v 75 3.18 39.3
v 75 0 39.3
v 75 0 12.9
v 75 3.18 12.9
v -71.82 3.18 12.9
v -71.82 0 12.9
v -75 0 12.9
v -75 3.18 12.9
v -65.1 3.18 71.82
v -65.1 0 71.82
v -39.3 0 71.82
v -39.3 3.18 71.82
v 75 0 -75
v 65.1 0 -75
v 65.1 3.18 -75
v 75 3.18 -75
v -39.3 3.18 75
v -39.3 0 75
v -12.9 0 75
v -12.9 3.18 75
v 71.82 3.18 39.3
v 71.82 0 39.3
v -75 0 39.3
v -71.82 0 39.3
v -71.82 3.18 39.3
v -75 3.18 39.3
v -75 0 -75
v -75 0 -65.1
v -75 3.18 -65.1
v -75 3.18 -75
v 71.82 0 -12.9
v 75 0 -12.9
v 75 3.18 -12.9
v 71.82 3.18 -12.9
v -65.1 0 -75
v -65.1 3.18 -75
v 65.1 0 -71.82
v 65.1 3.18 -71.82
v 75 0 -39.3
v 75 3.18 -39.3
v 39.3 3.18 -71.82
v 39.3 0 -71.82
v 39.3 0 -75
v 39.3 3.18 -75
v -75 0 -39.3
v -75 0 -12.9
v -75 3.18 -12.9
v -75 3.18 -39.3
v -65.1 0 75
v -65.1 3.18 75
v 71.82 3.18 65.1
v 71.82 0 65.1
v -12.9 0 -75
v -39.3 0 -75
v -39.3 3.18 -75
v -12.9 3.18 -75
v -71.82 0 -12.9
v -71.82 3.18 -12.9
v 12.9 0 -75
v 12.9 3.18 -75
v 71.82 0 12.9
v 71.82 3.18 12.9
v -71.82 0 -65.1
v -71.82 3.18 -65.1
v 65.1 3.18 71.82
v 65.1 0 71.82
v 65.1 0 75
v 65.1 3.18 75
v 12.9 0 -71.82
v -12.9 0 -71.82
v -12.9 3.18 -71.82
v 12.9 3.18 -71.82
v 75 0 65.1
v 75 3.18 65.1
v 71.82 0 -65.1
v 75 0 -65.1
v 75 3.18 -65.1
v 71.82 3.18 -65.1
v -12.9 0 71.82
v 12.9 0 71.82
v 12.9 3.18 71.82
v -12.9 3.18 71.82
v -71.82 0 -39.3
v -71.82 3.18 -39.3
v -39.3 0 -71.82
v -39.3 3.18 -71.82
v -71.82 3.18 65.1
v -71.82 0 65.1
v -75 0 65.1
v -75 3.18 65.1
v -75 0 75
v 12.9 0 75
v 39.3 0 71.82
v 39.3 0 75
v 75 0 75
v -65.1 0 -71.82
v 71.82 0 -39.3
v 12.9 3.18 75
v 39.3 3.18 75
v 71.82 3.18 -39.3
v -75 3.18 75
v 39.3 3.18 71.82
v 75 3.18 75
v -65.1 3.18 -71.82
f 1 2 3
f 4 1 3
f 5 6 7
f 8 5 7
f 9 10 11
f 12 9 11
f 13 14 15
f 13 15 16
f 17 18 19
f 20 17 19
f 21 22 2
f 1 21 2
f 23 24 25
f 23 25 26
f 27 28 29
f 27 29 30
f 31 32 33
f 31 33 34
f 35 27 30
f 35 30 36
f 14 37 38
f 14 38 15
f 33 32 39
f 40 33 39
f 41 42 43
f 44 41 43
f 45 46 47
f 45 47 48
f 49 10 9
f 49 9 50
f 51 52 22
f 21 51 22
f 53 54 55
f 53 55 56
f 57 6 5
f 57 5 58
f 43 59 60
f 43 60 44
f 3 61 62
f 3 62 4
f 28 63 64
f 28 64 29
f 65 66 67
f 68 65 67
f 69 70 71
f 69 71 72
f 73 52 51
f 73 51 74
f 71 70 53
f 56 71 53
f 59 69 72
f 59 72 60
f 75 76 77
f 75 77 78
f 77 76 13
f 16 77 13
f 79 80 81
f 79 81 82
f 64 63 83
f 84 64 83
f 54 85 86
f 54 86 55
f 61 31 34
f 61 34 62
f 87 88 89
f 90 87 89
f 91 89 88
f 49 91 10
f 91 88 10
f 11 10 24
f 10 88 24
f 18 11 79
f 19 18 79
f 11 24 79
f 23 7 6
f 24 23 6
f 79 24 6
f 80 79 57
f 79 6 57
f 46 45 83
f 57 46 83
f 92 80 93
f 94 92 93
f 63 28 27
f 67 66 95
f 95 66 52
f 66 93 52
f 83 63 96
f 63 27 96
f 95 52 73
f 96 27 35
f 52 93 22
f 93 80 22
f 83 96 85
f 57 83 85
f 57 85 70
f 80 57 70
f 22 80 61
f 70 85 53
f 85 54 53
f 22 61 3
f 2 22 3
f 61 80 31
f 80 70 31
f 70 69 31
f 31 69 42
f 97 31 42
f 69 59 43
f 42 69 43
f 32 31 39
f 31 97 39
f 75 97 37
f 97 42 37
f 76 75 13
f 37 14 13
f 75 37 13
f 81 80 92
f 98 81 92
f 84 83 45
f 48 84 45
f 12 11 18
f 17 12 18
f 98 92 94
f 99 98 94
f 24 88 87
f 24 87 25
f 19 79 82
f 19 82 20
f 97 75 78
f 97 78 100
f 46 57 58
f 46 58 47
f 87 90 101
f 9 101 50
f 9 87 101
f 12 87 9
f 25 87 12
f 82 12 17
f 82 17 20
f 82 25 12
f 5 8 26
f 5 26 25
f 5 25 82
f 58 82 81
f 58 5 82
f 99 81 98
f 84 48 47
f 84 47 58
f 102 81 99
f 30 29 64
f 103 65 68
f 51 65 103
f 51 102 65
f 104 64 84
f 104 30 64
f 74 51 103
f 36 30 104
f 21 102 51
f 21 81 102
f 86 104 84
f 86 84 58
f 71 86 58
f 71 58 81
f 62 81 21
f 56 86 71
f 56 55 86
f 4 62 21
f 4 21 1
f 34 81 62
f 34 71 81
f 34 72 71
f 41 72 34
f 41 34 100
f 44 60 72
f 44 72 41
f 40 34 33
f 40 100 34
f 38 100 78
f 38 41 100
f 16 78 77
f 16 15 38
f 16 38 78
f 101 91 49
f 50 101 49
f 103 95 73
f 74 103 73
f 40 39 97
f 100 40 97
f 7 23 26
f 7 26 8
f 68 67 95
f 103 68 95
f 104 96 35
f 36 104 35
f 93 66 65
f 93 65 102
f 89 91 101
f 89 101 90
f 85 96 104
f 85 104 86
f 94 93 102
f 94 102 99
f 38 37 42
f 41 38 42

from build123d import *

# Parameters (mm, degrees)
SKETCH1_W                 = 150
SKETCH1_H                 = 150
BOSS_EXTRUDE1_DEPTH       = 3.18
SKETCH6_W                 = 12.9
SKETCH6_H                 = 3.18
SKETCH6_W_2               = 25.8
CUT_EXTRUDE1_DEPTH        = 10
MIRROR2_COPY_1_SKETCH_W   = 12.9
MIRROR2_COPY_1_SKETCH_H   = 3.18
MIRROR2_COPY_1_SKETCH_W_2 = 25.8
MIRROR2_COPY_1_DEPTH      = 10
MIRROR3_COPY_1_SKETCH_W   = 12.9
MIRROR3_COPY_1_SKETCH_H   = 3.18
MIRROR3_COPY_1_SKETCH_W_2 = 25.8
MIRROR3_COPY_1_DEPTH      = 10
MIRROR4_COPY_1_SKETCH_W   = 12.9
MIRROR4_COPY_1_SKETCH_H   = 3.18
MIRROR4_COPY_1_SKETCH_W_2 = 25.8
MIRROR4_COPY_1_DEPTH      = 10
MIRROR4_COPY_2_SKETCH_W   = 12.9
MIRROR4_COPY_2_SKETCH_H   = 3.18
MIRROR4_COPY_2_SKETCH_W_2 = 25.8
MIRROR4_COPY_2_DEPTH      = 10
MIRROR4_COPY_3_SKETCH_W   = 12.9
MIRROR4_COPY_3_SKETCH_H   = 3.18
MIRROR4_COPY_3_SKETCH_W_2 = 25.8
MIRROR4_COPY_3_DEPTH      = 10


with BuildPart() as part:
    # Sketch1 → Boss-Extrude1 (new body)
    with BuildSketch(Plane(origin=(0, 0, 0), x_dir=(1, 0, 0), z_dir=(0, 1, 0))):
        Rectangle(SKETCH1_W, SKETCH1_H)
    extrude(amount=BOSS_EXTRUDE1_DEPTH)

    # Sketch6 → Cut-Extrude1 (cut)
    with BuildSketch(Plane.XZ):
        with Locations((-6.45, 73.41)):
            Rectangle(SKETCH6_W, SKETCH6_H)
        with Locations((-52.2, 73.41)):
            Rectangle(SKETCH6_W_2, SKETCH6_H)
    cut_extrude1 = extrude(amount=-CUT_EXTRUDE1_DEPTH, mode=Mode.SUBTRACT)

    # Mirror1: Cut-Extrude1 across plane
    add(cut_extrude1.mirror(Plane(origin=(0, 0, 0), x_dir=(0, 0, 1), z_dir=(1, 0, 0))), mode=Mode.SUBTRACT)

    # Mirror2: Cut-Extrude1 across plane
    add(cut_extrude1.mirror(Plane.XY), mode=Mode.SUBTRACT)

    # Mirror2 copy 1 sketch → Mirror2 copy 1 (cut)
    with BuildSketch(Plane(origin=(0, 0, 0), x_dir=(-1, 0, 0), z_dir=(0, -1, 0))):
        with Locations((-6.45, 73.41)):
            Rectangle(MIRROR2_COPY_1_SKETCH_W, MIRROR2_COPY_1_SKETCH_H)
        with Locations((-52.2, 73.41)):
            Rectangle(MIRROR2_COPY_1_SKETCH_W_2, MIRROR2_COPY_1_SKETCH_H)
    extrude(amount=-MIRROR2_COPY_1_DEPTH, mode=Mode.SUBTRACT)

    # Mirror3: Cut-Extrude1 across plane
    add(cut_extrude1.mirror(Plane(origin=(0, 0, 0), x_dir=(-0.707106781, 0, 0.707106781), z_dir=(0.707106781, 0, 0.707106781))), mode=Mode.SUBTRACT)

    # Mirror3 copy 1 sketch → Mirror3 copy 1 (cut)
    with BuildSketch(Plane(origin=(0, 0, 0), x_dir=(0, 0, 1), z_dir=(0, -1, 0))):
        with Locations((-6.45, 73.41)):
            Rectangle(MIRROR3_COPY_1_SKETCH_W, MIRROR3_COPY_1_SKETCH_H)
        with Locations((-52.2, 73.41)):
            Rectangle(MIRROR3_COPY_1_SKETCH_W_2, MIRROR3_COPY_1_SKETCH_H)
    extrude(amount=-MIRROR3_COPY_1_DEPTH, mode=Mode.SUBTRACT)

    # Mirror4 copy 1 sketch → Mirror4 copy 1 (cut)
    with BuildSketch(Plane(origin=(0, 0, 0), x_dir=(0, 0, -1), z_dir=(0, -1, 0))):
        with Locations((-6.45, 73.41)):
            Rectangle(MIRROR4_COPY_1_SKETCH_W, MIRROR4_COPY_1_SKETCH_H)
        with Locations((-52.2, 73.41)):
            Rectangle(MIRROR4_COPY_1_SKETCH_W_2, MIRROR4_COPY_1_SKETCH_H)
    extrude(amount=-MIRROR4_COPY_1_DEPTH, mode=Mode.SUBTRACT)

    # Mirror4 copy 2 sketch → Mirror4 copy 2 (cut)
    with BuildSketch(Plane(origin=(0, 0, 0), x_dir=(0, 0, 1), z_dir=(0, -1, 0))):
        with Locations((-6.45, -73.41)):
            Rectangle(MIRROR4_COPY_2_SKETCH_W, MIRROR4_COPY_2_SKETCH_H)
        with Locations((-52.2, -73.41)):
            Rectangle(MIRROR4_COPY_2_SKETCH_W_2, MIRROR4_COPY_2_SKETCH_H)
    extrude(amount=-MIRROR4_COPY_2_DEPTH, mode=Mode.SUBTRACT)

    # Mirror4 copy 3 sketch → Mirror4 copy 3 (cut)
    with BuildSketch(Plane(origin=(0, 0, 0), x_dir=(-1, 0, 0), z_dir=(0, -1, 0))):
        with Locations((-6.45, -73.41)):
            Rectangle(MIRROR4_COPY_3_SKETCH_W, MIRROR4_COPY_3_SKETCH_H)
        with Locations((-52.2, -73.41)):
            Rectangle(MIRROR4_COPY_3_SKETCH_W_2, MIRROR4_COPY_3_SKETCH_H)
    extrude(amount=-MIRROR4_COPY_3_DEPTH, mode=Mode.SUBTRACT)


solid = part.part
